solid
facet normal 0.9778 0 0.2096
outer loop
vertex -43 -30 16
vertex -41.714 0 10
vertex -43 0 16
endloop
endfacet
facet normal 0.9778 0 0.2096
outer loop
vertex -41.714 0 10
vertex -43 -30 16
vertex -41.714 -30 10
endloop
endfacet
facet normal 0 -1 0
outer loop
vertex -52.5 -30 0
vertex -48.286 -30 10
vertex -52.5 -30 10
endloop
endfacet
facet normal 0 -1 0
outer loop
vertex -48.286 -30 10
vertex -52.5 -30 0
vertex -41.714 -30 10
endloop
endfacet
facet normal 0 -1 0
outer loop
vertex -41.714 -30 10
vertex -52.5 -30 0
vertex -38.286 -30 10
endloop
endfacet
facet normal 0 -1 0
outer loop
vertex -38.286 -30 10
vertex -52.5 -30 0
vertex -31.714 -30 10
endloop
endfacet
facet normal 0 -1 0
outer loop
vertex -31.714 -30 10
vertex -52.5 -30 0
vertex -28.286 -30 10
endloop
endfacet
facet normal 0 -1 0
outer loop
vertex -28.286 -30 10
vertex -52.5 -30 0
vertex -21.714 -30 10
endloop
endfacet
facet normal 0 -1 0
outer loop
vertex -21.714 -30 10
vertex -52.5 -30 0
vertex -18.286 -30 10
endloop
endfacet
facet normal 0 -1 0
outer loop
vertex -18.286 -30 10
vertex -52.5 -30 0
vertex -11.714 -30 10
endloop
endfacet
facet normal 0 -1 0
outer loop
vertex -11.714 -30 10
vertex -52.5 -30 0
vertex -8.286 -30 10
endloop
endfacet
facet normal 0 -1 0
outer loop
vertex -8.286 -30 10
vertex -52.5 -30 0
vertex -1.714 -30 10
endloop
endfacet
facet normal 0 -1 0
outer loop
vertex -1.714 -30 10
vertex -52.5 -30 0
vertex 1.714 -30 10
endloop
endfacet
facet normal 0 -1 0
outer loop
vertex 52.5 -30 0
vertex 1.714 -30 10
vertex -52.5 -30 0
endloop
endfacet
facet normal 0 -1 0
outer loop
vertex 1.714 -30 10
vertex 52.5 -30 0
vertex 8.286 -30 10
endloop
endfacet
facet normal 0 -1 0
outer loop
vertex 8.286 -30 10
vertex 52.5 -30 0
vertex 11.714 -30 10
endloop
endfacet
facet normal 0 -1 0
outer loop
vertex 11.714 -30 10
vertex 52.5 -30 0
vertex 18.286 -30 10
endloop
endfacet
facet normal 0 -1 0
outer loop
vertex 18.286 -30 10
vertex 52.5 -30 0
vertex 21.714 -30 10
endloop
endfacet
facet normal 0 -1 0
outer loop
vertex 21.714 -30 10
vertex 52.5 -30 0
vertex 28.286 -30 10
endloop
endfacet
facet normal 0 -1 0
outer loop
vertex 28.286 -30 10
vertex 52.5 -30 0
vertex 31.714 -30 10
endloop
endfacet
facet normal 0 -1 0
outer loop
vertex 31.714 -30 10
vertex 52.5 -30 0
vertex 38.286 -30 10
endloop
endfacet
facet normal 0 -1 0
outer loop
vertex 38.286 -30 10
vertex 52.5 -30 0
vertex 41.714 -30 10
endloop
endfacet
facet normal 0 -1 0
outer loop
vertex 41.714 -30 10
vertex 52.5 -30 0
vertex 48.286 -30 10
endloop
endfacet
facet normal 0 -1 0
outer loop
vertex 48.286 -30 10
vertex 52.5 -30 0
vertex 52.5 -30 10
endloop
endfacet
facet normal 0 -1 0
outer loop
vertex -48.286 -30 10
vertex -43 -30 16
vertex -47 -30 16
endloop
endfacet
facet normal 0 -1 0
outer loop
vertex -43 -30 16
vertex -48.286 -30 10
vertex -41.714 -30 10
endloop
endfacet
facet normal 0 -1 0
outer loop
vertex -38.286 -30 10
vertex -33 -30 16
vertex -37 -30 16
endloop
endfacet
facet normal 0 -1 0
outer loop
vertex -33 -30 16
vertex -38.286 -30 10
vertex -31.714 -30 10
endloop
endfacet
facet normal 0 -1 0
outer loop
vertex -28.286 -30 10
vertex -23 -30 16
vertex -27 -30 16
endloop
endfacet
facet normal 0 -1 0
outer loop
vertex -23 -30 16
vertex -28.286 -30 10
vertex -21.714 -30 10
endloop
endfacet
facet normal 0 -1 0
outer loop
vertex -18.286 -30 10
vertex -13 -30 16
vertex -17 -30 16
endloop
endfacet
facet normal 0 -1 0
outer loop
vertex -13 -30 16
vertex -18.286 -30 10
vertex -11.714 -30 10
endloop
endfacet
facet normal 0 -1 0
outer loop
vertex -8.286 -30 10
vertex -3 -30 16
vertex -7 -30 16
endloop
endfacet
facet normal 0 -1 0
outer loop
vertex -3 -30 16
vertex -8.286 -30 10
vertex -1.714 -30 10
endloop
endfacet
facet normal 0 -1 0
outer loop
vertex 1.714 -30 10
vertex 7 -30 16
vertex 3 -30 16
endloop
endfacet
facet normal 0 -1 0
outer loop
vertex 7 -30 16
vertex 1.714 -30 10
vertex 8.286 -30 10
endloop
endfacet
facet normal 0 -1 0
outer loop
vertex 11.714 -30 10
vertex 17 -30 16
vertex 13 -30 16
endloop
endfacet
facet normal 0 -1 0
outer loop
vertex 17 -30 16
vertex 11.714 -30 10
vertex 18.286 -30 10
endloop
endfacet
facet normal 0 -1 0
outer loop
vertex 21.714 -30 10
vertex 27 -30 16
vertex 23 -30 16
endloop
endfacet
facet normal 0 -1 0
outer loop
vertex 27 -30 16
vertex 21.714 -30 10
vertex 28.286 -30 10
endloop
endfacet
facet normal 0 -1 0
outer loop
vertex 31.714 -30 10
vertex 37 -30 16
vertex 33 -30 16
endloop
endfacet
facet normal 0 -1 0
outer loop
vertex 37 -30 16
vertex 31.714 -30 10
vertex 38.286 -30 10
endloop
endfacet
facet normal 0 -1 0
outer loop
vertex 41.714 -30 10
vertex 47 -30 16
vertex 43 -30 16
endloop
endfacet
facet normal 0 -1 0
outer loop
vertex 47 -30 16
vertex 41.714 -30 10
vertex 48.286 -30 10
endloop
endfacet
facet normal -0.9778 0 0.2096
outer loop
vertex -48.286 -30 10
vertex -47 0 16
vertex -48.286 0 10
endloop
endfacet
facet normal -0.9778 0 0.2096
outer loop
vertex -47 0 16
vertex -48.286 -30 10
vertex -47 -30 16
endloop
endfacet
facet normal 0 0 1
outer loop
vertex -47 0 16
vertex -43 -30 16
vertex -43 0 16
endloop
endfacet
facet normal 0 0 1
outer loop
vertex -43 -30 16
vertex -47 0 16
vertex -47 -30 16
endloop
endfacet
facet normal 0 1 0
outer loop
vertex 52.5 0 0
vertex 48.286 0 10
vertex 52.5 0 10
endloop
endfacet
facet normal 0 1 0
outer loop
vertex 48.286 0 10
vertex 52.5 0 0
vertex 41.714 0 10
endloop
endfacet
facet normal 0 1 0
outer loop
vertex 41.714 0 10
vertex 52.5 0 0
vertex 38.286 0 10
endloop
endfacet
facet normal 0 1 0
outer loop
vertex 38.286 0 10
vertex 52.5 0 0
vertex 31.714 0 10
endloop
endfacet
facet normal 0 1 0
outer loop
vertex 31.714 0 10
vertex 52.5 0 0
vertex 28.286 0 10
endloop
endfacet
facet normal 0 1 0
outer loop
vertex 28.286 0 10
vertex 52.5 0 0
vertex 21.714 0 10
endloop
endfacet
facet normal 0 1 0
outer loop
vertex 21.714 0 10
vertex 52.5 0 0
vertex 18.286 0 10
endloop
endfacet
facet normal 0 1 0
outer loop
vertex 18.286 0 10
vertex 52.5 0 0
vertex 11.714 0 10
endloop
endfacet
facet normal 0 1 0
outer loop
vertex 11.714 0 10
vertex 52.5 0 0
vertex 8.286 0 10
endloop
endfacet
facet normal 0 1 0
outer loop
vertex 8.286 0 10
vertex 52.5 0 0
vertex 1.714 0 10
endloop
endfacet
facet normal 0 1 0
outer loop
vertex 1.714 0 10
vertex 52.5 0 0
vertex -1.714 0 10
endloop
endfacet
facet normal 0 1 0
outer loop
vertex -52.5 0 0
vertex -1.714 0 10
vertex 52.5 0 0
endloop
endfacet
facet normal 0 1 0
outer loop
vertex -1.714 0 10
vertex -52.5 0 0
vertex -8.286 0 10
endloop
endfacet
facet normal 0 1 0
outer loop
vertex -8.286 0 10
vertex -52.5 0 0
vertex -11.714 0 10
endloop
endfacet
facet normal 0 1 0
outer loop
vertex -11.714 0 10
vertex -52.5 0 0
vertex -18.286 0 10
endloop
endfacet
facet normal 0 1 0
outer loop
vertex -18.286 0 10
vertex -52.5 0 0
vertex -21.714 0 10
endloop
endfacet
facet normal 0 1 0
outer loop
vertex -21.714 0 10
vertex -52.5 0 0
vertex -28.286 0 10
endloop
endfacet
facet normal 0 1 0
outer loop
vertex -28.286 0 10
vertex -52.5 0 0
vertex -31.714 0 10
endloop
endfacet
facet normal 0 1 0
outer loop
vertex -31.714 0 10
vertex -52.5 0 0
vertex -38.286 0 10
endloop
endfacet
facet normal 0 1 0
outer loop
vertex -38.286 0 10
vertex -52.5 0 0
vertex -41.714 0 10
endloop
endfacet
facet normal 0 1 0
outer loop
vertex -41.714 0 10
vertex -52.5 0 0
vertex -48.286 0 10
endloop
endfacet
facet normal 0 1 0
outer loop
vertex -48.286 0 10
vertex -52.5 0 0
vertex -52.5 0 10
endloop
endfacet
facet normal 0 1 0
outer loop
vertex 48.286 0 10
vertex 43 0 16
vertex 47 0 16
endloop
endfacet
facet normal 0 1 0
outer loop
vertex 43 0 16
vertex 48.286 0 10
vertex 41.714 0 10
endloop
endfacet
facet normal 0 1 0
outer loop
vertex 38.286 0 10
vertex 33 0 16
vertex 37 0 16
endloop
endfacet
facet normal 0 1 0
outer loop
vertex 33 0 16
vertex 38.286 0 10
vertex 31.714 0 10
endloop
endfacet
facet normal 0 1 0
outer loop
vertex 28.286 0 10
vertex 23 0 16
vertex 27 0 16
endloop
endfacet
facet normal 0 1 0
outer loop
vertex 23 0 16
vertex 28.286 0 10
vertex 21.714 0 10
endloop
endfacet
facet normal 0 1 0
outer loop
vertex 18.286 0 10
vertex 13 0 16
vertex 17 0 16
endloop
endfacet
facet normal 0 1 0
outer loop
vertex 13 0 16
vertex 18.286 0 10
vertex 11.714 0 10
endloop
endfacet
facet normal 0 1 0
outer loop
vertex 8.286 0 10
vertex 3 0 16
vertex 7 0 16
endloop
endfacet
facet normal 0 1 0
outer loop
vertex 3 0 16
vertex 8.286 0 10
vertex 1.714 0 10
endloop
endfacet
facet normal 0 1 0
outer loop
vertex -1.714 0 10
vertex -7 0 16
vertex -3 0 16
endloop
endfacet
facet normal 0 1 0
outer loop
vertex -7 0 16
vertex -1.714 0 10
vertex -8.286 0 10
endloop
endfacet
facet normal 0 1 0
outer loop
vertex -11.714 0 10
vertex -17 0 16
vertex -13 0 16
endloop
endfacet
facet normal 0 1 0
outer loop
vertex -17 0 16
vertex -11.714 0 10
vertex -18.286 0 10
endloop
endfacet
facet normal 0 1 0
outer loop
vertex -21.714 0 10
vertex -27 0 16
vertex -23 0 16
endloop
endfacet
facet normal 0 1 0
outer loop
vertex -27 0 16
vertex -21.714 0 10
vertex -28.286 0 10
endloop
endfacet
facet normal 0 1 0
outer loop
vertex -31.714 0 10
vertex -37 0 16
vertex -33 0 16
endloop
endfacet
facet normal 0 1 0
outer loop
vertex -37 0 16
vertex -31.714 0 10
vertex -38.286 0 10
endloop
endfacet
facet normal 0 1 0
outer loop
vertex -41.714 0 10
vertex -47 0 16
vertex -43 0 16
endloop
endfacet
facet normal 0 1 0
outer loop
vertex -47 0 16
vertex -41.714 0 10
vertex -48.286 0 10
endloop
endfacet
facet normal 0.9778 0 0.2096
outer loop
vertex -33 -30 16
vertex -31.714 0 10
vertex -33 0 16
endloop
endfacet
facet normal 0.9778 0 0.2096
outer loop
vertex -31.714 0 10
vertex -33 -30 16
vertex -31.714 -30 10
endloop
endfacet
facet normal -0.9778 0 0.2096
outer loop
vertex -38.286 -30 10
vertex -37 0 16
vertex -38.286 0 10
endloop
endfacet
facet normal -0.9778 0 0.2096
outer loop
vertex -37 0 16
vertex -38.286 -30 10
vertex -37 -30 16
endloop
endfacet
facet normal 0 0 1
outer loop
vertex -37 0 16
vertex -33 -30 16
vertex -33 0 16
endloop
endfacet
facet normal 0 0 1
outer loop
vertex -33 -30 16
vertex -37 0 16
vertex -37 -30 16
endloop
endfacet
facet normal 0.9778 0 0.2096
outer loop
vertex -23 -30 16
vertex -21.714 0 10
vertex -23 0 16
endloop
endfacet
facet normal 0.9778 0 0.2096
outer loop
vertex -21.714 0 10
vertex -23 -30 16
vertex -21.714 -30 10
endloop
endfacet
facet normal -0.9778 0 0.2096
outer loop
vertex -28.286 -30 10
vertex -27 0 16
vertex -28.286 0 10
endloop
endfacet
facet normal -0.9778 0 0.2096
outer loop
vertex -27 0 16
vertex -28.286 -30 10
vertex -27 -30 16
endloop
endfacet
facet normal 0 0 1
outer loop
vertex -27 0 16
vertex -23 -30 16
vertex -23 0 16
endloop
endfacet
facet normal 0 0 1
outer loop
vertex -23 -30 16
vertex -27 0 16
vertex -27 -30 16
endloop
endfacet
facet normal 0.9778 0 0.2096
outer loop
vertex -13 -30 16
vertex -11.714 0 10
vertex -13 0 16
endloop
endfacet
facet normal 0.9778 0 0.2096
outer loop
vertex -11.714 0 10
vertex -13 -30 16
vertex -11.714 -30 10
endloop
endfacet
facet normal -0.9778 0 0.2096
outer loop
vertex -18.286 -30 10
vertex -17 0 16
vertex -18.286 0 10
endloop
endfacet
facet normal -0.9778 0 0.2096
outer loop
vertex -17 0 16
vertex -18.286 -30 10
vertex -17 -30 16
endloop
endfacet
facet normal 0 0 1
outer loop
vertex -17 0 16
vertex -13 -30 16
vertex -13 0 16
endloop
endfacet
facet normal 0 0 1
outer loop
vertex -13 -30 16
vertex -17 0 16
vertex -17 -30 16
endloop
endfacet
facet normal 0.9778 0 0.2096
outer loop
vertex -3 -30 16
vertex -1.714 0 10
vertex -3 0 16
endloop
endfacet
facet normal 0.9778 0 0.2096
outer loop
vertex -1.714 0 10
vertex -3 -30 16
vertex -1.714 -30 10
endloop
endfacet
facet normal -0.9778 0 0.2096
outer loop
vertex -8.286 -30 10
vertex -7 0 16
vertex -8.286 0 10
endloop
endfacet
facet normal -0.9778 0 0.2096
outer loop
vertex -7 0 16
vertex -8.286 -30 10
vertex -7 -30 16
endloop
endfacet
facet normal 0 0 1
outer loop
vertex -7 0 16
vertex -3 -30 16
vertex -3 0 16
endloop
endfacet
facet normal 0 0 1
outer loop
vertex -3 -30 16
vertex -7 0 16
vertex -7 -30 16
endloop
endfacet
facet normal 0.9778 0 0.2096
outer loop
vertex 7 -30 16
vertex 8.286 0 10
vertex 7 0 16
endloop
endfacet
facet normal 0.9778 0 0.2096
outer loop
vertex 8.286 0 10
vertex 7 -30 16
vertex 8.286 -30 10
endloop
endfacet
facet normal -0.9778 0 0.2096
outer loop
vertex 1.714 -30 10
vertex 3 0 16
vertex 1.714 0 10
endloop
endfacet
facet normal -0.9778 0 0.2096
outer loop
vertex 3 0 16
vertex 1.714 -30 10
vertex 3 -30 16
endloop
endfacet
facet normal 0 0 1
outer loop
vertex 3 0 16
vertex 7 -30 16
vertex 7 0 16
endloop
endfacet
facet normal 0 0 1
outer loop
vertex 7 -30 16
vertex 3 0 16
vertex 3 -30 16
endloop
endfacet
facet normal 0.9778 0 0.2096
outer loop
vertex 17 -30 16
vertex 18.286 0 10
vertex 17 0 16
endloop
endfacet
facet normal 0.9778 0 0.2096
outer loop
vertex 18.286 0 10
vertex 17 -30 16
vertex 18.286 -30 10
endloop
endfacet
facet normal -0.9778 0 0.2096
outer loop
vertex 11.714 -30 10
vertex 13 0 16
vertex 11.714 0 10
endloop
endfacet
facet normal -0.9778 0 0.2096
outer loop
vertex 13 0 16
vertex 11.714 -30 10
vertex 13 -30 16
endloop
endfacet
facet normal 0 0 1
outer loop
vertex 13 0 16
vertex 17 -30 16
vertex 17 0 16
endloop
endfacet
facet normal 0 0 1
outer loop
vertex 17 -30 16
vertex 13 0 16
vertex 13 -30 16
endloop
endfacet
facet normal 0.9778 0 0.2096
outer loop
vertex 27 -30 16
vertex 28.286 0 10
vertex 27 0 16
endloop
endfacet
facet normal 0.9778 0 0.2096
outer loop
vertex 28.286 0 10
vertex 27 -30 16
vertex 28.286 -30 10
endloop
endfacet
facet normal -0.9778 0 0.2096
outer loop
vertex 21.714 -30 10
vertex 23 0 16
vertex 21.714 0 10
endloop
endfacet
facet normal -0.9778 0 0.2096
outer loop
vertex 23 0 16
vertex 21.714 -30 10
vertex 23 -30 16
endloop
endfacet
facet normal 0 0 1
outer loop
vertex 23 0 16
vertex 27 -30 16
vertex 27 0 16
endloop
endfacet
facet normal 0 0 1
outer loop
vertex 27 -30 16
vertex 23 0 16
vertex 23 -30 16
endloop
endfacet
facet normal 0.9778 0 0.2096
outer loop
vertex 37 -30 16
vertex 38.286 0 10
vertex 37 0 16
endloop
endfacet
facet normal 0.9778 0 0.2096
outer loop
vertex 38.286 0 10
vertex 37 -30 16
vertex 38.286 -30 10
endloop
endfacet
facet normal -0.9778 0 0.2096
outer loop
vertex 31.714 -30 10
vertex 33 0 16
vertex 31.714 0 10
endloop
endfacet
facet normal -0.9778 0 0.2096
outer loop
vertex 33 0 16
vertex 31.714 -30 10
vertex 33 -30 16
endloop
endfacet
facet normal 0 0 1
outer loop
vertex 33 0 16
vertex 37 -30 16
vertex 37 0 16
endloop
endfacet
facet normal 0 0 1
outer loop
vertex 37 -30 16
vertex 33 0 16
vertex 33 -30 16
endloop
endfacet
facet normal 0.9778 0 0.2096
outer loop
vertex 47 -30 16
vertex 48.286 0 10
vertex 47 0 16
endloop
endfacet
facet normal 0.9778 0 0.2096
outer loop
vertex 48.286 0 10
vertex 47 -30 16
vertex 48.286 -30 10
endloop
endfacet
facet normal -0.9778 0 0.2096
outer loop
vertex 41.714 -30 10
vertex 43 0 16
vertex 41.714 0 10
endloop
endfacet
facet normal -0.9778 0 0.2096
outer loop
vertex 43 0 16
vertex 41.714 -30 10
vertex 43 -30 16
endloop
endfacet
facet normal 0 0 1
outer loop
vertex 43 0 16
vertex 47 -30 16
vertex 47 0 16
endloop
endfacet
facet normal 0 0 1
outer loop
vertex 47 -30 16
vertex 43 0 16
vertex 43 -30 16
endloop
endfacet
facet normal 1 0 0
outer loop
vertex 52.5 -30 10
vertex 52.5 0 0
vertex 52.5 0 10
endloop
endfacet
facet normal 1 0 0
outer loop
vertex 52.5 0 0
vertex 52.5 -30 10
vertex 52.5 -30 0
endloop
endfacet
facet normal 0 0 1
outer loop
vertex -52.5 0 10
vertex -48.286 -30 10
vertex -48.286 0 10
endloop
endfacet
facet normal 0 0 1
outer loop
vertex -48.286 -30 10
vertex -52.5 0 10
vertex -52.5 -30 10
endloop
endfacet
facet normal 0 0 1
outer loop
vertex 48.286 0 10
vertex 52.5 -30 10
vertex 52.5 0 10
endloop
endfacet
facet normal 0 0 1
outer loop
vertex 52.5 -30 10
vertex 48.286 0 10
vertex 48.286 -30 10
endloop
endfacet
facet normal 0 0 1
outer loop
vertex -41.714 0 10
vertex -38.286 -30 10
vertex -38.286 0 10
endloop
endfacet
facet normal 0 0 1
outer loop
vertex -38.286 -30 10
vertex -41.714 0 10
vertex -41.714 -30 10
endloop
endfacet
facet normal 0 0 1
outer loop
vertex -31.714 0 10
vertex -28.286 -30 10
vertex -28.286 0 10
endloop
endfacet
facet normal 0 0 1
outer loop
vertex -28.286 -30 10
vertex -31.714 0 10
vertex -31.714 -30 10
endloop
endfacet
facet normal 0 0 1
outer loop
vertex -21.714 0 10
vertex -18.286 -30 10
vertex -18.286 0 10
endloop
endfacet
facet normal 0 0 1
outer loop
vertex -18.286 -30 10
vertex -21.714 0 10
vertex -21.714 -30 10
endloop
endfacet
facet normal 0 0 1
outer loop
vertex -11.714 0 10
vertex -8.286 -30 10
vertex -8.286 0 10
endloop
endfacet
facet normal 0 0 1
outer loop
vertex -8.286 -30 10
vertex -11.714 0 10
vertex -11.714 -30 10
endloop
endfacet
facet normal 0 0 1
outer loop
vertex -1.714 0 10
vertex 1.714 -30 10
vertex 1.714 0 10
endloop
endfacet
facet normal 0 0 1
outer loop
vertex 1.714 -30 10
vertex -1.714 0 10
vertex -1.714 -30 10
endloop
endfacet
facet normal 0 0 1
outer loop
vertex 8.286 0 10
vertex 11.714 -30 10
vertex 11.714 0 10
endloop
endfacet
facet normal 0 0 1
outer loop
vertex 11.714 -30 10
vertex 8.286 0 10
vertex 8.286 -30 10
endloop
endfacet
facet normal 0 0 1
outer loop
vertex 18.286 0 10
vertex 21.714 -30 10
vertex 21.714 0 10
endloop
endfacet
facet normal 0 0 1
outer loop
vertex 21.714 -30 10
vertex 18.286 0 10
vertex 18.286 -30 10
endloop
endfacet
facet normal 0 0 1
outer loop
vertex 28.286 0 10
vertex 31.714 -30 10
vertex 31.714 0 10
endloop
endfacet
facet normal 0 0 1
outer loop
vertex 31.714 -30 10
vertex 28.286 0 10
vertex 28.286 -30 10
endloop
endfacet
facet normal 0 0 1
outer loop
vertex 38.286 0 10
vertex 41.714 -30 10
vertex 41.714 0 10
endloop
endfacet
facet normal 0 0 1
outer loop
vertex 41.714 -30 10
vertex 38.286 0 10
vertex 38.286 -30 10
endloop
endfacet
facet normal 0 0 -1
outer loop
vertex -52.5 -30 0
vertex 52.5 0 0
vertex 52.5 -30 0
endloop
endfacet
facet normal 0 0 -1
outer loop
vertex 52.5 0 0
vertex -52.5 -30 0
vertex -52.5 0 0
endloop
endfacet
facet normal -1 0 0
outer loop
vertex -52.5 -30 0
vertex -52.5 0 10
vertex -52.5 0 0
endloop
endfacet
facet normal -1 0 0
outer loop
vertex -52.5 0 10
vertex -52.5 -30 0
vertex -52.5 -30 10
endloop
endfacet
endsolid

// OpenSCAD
$fn = 32;

// ----------------------------------------------------------------------
// Toothed rack, 10 teeth
// 10 mm pitch, 6 mm teeth
// ----------------------------------------------------------------------

// --- parameters (mm) ---
bar_w = 30;       // bar width (Y)
seat_tol = 0.15;  // tolerance at the seating features
free_tol = 0.5;   // general tolerance on the free sizes
bar_h = 10;       // bar height (Z)
teeth = 10;       // number of teeth
pitch = 10;       // tooth pitch
tooth_h = 6;      // tooth height above the bar
root_w = 7;       // tooth width at the root
crest_w = 4;      // tooth width at the crest

// --- derived feature positions (mm) ---
span = (teeth - 1) * pitch;  // = 90   distance between the outer teeth
bar_l = span + root_w + 8;   // = 105   bar length: teeth plus 4 mm at each end
tooth_x = -span / 2;         // = -45   X of the first tooth
height = bar_h + tooth_h;    // = 16   overall height
feature_centers = [
  [tooth_x + 0 * pitch, -bar_w / 2],
  [tooth_x + 1 * pitch, -bar_w / 2],
  [tooth_x + 2 * pitch, -bar_w / 2],
  [tooth_x + 3 * pitch, -bar_w / 2],
  [tooth_x + 4 * pitch, -bar_w / 2],
  [tooth_x + 5 * pitch, -bar_w / 2],
  [tooth_x + 6 * pitch, -bar_w / 2],
  [tooth_x + 7 * pitch, -bar_w / 2],
  [tooth_x + 8 * pitch, -bar_w / 2],
  [tooth_x + 9 * pitch, -bar_w / 2]
];   // tooth centre line, drives the tooth loop

// bar with a rack of teeth, one extruded trapezoium per centre
module rack_tooth() {
  linear_extrude(height = bar_w)
    polygon(points = [
      [0, 0],
      [root_w, 0],
      [root_w / 2 + crest_w / 2, tooth_h + 1],
      [root_w / 2 - crest_w / 2, tooth_h + 1]
    ]);
}

union() {
  translate([-bar_l / 2, -bar_w, 0]) cube([bar_l, bar_w, bar_h]);
  for (centre = feature_centers)
    translate([centre[0] - root_w / 2, 0, bar_h - 1]) rotate([90, 0, 0]) rack_tooth();
}
